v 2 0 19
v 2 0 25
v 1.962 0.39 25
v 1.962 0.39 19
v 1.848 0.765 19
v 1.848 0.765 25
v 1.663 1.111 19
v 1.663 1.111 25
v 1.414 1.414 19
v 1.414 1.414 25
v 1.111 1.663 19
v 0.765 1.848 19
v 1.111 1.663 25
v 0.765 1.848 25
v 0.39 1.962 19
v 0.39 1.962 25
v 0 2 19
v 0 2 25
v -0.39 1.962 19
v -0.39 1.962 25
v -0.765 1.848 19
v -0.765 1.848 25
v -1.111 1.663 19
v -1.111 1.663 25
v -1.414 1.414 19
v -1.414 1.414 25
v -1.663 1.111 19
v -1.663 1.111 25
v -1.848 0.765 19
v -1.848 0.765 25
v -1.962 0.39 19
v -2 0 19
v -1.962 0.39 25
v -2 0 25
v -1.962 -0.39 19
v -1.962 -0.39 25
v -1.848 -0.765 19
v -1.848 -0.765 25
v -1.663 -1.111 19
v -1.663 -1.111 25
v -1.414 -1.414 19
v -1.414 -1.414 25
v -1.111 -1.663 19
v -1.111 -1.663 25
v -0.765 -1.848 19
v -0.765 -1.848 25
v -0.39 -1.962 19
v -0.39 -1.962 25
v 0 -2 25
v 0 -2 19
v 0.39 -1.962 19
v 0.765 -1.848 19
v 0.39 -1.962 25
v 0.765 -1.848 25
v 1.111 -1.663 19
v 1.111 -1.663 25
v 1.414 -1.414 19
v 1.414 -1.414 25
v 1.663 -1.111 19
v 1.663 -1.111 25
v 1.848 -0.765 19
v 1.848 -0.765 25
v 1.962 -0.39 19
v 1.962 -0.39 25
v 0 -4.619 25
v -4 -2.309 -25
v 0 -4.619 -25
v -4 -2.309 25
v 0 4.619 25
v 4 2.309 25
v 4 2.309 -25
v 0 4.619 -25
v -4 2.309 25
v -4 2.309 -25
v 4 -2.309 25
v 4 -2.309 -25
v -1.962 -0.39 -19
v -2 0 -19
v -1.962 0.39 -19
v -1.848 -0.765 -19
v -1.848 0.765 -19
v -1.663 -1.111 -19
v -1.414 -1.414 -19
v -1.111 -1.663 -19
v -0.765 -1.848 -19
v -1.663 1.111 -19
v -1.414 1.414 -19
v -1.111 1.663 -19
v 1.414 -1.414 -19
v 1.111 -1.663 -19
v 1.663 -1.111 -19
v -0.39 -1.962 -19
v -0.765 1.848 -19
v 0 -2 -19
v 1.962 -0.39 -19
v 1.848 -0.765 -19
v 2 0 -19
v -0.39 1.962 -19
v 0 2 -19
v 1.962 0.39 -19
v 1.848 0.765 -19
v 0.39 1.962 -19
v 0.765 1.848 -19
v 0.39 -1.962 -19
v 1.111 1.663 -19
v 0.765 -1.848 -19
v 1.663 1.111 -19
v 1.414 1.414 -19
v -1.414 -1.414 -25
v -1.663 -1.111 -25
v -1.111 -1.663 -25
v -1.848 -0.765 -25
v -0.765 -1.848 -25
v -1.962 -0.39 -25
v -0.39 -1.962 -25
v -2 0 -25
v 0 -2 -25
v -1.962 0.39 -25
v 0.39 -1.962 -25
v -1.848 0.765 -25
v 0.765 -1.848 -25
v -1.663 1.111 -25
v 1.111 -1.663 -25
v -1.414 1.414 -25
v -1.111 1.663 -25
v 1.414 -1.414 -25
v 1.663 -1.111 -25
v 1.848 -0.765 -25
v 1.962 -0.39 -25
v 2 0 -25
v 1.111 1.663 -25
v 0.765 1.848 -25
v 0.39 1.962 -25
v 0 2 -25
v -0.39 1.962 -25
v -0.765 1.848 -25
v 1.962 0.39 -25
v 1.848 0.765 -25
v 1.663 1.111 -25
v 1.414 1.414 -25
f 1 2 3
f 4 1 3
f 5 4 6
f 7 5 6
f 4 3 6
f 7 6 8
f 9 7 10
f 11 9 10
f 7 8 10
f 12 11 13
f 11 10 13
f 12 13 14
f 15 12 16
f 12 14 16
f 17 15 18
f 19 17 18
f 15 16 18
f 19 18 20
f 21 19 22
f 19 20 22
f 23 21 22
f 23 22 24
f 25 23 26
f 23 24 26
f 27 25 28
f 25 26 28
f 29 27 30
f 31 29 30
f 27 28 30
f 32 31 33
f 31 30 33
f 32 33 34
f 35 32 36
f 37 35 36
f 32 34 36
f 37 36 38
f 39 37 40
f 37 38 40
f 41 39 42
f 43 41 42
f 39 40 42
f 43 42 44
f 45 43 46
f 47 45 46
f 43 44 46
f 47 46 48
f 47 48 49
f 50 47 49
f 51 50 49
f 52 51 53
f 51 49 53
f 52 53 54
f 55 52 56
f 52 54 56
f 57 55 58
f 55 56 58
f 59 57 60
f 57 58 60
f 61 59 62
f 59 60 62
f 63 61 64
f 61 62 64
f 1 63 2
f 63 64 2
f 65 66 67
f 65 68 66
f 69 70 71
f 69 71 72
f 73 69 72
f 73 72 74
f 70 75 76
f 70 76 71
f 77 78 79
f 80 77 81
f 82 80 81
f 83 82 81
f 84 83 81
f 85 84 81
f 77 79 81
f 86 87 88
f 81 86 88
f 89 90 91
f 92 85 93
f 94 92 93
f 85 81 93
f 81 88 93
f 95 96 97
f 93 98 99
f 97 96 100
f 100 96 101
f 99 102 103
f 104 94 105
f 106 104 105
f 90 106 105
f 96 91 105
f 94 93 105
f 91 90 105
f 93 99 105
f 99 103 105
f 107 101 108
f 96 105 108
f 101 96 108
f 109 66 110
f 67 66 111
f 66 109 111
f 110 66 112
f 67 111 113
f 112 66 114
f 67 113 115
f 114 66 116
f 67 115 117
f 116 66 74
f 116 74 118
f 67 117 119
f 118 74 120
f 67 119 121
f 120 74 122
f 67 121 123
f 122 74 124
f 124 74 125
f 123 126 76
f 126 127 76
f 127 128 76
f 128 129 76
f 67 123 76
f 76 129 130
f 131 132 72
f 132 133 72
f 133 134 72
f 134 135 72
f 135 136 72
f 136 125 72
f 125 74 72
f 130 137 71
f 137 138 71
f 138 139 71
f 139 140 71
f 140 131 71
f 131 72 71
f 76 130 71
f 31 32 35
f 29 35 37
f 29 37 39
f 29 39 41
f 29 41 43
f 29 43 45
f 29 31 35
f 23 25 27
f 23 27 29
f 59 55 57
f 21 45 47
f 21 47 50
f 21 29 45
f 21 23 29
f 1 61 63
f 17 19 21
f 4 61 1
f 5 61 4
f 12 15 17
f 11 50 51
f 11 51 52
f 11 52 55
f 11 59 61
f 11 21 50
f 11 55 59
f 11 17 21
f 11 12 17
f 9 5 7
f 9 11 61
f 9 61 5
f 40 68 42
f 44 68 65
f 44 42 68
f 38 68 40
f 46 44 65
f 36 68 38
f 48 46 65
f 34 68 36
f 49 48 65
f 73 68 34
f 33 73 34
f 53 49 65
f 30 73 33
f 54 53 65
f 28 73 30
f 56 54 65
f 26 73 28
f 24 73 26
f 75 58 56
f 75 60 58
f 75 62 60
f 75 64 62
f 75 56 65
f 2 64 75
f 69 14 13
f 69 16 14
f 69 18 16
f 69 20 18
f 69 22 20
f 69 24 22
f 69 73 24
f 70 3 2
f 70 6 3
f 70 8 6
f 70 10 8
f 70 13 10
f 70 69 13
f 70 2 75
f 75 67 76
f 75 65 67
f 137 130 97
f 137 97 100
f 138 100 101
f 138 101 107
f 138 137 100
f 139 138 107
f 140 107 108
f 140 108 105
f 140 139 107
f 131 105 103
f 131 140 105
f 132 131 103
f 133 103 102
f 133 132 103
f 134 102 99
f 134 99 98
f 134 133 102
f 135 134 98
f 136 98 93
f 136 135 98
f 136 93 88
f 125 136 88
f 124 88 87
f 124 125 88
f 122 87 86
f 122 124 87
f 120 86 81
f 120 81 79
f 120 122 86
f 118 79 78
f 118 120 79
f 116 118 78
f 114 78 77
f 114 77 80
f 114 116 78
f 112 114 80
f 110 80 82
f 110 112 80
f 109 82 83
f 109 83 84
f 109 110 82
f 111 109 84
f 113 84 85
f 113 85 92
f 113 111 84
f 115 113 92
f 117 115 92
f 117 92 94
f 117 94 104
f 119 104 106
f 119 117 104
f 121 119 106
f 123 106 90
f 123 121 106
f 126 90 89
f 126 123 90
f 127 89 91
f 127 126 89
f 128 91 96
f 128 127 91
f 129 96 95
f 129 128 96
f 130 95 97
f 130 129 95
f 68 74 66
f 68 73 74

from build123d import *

# Parameters (mm, degrees)
PAD_DEPTH    = 25
SKETCH001_R  = 2
POCKET_DEPTH = 6


with BuildPart() as part:
    # Sketch → Pad (new body, symmetric)
    with BuildSketch(Plane.XY):
        Polygon((0, -4.618802), (4, -2.309401), (4, 2.309401), (0, 4.618802), (-4, 2.309401), (-4, -2.309401), align=None)
    extrude(amount=PAD_DEPTH, both=True)

    # Sketch001 (on Face8 of Pad) → Pocket (cut)
    with BuildSketch(Plane.XY.offset(25)):
        Circle(SKETCH001_R)
    pocket = extrude(amount=-POCKET_DEPTH, mode=Mode.SUBTRACT)

    # Mirrored: Pocket across XY
    add(pocket.mirror(Plane.XY), mode=Mode.SUBTRACT)


solid = part.part
